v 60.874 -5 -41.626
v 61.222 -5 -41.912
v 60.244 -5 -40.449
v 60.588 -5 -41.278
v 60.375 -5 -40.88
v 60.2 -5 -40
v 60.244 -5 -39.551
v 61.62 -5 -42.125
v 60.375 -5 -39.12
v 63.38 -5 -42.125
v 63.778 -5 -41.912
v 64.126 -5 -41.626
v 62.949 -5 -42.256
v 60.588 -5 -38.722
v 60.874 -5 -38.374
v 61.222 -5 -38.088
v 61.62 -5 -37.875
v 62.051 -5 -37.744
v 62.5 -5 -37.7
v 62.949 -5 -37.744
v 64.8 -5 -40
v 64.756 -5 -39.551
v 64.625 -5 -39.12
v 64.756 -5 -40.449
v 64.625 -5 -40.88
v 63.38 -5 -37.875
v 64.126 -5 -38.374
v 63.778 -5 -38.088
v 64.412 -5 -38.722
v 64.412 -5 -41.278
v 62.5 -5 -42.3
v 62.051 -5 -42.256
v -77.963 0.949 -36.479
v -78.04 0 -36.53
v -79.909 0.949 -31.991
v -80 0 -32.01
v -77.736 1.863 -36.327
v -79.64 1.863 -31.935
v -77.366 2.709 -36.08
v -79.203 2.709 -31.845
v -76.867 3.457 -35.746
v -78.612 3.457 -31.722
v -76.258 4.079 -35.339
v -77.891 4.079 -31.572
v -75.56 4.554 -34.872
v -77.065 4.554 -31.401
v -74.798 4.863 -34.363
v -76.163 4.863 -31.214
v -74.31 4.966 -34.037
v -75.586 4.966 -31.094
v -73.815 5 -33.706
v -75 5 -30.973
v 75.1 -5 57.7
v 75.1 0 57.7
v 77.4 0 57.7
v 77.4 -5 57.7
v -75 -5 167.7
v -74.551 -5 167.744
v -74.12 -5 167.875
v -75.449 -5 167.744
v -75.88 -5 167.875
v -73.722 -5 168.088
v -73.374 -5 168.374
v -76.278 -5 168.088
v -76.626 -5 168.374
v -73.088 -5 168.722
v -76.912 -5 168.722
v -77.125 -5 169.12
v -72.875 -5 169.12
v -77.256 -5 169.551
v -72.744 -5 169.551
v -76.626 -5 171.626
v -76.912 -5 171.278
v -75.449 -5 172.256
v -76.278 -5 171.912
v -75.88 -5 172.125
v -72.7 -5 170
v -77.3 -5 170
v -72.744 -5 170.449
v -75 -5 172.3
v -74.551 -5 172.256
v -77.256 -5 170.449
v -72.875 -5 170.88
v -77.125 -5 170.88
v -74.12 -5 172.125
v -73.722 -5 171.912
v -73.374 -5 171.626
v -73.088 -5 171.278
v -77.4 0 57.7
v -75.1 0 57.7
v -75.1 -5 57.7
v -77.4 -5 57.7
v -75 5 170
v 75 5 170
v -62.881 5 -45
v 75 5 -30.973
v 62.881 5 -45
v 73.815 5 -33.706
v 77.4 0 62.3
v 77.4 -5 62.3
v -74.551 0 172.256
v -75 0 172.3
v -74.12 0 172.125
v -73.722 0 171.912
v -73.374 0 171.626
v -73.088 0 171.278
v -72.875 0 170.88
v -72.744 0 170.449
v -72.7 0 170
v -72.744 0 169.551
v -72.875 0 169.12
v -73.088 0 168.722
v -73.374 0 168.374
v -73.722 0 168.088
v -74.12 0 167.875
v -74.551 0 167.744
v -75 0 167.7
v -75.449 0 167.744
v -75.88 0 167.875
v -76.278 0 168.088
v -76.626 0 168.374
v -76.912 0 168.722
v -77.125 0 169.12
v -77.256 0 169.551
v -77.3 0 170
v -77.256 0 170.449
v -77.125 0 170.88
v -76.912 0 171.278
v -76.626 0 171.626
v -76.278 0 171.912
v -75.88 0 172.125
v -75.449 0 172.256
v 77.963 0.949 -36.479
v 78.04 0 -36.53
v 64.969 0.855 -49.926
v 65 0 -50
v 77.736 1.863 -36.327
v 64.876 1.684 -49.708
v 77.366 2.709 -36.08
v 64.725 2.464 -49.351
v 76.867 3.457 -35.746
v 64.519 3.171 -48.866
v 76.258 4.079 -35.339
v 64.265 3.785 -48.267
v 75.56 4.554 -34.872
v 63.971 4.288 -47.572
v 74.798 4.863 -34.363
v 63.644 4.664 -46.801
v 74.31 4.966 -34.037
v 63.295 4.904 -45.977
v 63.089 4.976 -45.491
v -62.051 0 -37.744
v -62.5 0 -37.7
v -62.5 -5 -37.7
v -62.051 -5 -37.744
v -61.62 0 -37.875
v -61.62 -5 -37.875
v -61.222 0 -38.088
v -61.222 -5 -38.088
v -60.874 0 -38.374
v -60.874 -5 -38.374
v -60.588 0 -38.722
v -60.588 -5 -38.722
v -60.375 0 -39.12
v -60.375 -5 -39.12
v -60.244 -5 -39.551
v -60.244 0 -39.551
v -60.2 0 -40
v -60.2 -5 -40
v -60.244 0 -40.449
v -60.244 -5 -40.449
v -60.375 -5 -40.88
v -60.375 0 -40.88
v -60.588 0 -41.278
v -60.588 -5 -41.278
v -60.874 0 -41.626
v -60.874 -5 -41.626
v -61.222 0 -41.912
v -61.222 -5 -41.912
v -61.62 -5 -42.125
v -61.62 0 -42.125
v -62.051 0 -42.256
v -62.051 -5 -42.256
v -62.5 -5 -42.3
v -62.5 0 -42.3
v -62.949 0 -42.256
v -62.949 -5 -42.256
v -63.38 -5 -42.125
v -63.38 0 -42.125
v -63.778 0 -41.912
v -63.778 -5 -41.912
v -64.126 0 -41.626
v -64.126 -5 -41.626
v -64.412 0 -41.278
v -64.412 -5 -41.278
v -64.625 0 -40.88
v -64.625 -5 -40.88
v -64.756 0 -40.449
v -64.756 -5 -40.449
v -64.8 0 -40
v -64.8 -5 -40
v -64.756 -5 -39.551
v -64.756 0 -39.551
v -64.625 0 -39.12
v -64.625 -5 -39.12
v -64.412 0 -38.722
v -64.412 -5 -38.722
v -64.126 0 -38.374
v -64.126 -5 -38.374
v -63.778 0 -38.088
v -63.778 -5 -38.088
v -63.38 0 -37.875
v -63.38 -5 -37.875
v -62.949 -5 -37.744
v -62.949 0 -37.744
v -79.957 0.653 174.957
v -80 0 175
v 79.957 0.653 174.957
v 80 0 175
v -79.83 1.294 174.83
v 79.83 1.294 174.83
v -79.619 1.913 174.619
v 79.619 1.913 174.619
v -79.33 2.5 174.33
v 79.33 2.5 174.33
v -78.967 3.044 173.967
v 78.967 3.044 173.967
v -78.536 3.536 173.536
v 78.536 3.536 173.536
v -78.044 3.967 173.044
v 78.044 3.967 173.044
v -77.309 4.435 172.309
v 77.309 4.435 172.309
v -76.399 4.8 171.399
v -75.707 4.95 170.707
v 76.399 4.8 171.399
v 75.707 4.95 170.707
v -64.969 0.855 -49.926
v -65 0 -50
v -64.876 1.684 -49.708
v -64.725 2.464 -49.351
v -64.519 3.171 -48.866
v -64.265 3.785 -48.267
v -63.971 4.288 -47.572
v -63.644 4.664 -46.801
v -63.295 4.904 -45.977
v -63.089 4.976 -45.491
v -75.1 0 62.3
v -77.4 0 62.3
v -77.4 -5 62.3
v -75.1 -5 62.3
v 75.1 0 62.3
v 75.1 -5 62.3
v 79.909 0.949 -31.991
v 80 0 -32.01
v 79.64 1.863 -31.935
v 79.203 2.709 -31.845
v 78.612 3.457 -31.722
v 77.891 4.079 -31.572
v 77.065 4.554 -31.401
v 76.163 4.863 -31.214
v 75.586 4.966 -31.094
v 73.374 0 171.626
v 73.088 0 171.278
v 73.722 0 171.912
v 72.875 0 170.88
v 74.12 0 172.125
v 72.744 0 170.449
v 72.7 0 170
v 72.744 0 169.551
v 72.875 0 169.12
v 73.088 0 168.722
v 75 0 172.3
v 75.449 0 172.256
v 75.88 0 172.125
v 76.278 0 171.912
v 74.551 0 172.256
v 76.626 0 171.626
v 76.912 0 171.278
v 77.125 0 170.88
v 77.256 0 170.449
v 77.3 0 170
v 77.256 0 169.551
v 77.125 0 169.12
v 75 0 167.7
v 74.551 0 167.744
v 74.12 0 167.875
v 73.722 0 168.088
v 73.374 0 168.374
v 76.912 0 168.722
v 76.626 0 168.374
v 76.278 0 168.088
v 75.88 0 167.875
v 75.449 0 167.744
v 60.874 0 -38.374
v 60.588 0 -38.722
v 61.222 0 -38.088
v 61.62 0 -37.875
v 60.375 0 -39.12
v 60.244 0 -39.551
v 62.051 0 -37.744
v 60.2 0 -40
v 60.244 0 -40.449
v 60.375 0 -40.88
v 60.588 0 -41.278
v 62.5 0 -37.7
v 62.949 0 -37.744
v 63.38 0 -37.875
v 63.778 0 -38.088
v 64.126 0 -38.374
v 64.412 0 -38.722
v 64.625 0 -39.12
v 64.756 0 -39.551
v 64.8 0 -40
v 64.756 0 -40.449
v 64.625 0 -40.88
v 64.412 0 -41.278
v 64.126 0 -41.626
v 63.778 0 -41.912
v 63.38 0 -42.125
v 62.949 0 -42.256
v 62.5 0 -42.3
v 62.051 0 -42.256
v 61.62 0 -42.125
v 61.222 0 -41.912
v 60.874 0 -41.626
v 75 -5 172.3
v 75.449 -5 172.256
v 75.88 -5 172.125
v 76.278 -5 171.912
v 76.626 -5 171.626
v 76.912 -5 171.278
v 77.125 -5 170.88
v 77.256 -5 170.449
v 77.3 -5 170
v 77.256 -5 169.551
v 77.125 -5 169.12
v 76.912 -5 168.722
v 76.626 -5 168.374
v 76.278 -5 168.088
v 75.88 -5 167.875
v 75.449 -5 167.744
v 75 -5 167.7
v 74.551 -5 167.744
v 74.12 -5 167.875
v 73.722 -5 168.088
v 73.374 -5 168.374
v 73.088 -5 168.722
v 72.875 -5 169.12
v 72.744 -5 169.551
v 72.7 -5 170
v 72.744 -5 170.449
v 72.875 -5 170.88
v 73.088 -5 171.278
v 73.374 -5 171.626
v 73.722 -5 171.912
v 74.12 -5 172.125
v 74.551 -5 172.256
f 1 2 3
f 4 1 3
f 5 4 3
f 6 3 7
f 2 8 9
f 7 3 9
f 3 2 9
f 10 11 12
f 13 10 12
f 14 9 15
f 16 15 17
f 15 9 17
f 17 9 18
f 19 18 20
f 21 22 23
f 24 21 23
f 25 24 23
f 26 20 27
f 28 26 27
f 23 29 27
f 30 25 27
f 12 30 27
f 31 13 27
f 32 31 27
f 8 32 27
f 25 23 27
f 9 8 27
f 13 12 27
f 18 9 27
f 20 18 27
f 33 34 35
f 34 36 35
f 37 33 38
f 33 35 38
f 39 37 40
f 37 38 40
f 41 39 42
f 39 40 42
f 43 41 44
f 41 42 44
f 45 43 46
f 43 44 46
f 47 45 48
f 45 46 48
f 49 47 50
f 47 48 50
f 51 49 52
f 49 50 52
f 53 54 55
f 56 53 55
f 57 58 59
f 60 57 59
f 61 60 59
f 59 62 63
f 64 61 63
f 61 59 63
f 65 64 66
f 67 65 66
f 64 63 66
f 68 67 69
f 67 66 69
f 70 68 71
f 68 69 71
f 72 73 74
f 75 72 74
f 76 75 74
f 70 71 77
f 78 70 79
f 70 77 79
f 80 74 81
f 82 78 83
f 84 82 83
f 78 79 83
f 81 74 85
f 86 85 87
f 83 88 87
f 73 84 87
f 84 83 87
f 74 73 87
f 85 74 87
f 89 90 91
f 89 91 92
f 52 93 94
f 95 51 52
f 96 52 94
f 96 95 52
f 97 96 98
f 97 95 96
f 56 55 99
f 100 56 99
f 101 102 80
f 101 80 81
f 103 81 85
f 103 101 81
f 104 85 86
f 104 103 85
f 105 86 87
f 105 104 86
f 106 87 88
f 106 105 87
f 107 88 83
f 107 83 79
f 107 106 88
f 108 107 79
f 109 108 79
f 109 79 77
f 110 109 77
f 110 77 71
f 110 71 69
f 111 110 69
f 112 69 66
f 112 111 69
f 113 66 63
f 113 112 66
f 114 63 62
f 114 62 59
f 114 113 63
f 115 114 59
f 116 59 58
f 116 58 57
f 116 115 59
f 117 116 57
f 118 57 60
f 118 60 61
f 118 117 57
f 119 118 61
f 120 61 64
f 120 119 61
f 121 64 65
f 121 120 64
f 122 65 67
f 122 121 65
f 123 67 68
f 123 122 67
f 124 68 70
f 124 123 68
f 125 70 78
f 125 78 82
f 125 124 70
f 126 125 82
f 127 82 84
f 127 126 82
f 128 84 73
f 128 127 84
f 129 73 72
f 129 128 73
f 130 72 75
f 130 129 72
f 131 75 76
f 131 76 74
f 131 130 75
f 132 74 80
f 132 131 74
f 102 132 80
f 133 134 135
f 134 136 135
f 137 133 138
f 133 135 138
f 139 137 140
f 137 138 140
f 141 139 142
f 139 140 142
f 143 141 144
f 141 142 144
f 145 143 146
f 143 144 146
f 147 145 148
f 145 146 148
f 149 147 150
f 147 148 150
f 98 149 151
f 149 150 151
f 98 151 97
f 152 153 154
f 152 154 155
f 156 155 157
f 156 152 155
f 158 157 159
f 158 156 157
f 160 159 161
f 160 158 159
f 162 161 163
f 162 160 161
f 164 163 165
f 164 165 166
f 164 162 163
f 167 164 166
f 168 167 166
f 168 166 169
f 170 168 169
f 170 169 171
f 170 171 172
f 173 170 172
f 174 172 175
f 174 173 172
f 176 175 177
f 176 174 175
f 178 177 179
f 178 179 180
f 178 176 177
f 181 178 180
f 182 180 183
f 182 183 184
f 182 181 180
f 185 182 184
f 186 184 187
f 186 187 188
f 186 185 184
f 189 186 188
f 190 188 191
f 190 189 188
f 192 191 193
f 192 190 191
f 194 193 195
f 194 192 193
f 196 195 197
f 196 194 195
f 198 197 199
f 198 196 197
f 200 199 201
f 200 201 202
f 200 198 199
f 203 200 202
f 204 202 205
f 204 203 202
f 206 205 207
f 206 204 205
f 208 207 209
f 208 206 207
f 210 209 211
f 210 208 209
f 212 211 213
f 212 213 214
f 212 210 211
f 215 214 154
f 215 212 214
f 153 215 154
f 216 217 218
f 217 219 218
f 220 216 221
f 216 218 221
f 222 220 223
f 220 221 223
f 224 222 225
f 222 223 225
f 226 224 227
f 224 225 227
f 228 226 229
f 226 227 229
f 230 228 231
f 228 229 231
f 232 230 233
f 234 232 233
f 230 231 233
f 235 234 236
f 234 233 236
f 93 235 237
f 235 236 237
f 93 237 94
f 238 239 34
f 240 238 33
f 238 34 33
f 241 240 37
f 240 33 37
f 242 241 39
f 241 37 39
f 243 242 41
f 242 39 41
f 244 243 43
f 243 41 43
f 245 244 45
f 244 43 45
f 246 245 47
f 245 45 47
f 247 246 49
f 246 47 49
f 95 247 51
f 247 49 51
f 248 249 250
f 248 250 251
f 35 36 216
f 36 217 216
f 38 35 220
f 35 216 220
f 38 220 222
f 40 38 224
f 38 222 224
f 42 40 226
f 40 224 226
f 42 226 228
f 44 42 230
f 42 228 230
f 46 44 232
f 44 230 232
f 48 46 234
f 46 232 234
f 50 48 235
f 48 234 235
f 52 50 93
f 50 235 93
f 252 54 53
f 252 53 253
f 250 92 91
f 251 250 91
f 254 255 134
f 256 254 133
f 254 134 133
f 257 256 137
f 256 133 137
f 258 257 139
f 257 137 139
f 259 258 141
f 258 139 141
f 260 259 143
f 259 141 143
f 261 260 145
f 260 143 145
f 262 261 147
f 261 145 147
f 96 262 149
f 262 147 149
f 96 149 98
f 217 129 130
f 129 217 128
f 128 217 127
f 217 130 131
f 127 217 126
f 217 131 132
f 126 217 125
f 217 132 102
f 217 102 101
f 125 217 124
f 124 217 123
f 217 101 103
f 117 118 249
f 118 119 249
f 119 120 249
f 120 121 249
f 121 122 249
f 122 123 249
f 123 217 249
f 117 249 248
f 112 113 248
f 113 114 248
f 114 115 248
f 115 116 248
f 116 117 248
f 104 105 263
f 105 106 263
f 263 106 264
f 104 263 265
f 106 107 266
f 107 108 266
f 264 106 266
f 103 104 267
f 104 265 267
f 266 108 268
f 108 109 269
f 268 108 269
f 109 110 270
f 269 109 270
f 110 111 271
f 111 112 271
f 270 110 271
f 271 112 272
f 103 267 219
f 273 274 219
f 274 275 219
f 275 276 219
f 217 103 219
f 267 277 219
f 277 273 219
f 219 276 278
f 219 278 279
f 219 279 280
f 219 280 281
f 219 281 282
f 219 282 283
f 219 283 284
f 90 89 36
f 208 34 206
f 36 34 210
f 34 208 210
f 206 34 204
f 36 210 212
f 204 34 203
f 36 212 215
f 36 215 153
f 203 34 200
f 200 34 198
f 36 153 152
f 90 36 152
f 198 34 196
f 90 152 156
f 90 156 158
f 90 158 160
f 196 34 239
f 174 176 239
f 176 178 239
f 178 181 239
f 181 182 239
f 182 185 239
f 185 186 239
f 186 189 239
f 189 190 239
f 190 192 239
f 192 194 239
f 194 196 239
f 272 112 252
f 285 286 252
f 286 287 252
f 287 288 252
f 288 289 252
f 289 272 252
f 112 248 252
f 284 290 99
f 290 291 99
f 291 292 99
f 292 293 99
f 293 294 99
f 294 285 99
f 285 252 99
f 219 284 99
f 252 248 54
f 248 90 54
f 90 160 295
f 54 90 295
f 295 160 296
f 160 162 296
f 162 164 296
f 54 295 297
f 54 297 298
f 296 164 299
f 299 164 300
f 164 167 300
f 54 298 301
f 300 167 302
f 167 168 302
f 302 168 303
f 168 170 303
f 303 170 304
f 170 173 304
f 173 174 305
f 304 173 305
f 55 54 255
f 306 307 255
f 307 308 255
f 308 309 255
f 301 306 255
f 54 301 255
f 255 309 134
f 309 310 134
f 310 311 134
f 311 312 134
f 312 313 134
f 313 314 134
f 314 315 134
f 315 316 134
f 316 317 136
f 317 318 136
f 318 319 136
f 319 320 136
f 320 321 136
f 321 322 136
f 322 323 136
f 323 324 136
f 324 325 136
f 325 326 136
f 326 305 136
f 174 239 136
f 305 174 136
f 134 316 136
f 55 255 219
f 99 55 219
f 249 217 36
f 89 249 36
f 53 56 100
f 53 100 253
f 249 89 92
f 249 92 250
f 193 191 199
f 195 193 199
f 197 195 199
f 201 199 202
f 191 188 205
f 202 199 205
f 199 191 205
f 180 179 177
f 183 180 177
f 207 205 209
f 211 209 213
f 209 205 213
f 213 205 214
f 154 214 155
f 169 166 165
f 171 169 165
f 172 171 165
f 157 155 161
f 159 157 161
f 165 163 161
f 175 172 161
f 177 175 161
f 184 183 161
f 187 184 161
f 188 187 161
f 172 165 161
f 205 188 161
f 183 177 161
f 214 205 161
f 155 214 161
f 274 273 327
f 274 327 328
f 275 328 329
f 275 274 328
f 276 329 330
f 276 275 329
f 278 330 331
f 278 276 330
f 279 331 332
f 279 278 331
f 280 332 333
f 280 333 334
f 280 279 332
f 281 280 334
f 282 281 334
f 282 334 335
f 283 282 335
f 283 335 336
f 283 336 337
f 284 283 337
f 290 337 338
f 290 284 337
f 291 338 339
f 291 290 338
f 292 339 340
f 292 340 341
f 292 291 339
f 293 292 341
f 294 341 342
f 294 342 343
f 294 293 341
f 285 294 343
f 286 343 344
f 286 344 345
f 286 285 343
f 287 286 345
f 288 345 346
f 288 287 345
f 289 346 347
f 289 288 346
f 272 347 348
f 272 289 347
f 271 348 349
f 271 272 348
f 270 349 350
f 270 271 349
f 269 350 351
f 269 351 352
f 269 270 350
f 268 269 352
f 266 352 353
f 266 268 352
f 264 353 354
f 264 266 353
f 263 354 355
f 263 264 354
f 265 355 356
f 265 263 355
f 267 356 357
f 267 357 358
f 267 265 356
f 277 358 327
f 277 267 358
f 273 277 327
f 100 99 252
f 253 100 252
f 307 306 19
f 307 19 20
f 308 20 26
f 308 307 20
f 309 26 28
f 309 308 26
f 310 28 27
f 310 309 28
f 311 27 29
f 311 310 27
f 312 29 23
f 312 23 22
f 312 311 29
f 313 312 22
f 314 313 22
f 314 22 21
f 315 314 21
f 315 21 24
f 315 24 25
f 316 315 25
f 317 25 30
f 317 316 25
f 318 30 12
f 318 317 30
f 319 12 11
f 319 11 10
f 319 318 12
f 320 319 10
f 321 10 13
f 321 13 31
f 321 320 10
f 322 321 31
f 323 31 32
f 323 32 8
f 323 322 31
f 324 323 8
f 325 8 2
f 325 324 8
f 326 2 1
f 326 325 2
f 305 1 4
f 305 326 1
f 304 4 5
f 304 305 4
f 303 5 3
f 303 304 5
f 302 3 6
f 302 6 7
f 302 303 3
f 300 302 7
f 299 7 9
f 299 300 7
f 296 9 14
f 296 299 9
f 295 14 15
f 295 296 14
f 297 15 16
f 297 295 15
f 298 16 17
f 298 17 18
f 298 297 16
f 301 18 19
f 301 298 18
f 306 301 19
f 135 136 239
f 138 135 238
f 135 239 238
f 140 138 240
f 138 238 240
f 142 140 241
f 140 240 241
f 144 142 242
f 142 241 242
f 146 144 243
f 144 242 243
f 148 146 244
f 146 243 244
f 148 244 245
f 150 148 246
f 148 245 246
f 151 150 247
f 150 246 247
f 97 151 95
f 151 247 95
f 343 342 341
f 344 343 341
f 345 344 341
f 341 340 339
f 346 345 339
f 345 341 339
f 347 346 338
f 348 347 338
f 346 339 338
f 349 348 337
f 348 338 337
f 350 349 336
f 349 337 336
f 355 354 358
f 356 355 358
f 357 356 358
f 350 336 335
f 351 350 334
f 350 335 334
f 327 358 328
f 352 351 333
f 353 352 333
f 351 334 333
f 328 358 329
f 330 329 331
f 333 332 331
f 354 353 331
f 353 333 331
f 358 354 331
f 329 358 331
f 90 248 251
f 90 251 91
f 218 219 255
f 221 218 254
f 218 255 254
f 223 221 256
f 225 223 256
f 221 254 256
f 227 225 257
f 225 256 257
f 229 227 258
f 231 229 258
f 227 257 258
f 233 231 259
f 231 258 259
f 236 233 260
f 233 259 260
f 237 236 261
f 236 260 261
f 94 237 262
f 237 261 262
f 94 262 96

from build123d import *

# Parameters (mm, degrees)
BOSS_EXTRUDE1_DEPTH = 5
FILLET1_R           = 5
SKETCH3_R           = 2.3
BOSS_EXTRUDE2_DEPTH = 5


with BuildPart() as part:
    # Lid → Boss-Extrude1 (new body)
    with BuildSketch(Plane(origin=(0, 0, 0), x_dir=(1, 0, 0), z_dir=(0, 1, 0))):
        Polygon((-80, -175), (80, -175), (80, 30), (80, 32.01), (78.04, 36.53), (65, 50), (-65, 50), (-78.04, 36.53), (-80, 32.01), (-80, 30), align=None)
    extrude(amount=BOSS_EXTRUDE1_DEPTH)

    # Fillet1
    fillet1_edges = [part.edges().sort_by_distance(p)[0] for p in [
        (0, 5, 175),
        (-79.02, 5, -34.27),
        (-80, 5, 71.495),
        (-71.52, 5, -43.265),
        (0, 5, -50),
        (71.52, 5, -43.265),
        (79.02, 5, -34.27),
        (80, 5, 71.495),
    ]]
    fillet(fillet1_edges, radius=FILLET1_R - 0.0001)  # a hair under: the kernel refuses the full size

    # Sketch3 → Boss-Extrude2 (add)
    with BuildSketch(Plane(origin=(0, 0, 0), x_dir=(1, 0, 0), z_dir=(0, 1, 0))):
        with Locations(Location((-62.5, 40, 0), (0, 0, 270))):
            Circle(SKETCH3_R)
        with Locations(Location((62.5, 40, 0), (0, 0, 270))):
            Circle(SKETCH3_R)
        with Locations(Location((75, -170, 0), (0, 0, 270))):
            Circle(SKETCH3_R)
        with Locations(Location((-75, -170, 0), (0, 0, 270))):
            Circle(SKETCH3_R)
        Polygon((-77.4, -57.7), (-77.4, -62.3), (-75.1, -62.3), (-75.1, -60), (-75.1, -57.7), align=None)
        Polygon((75.1, -57.7), (77.4, -57.7), (77.4, -62.3), (75.1, -62.3), (75.1, -60), align=None)
    extrude(amount=-BOSS_EXTRUDE2_DEPTH)


solid = part.part
